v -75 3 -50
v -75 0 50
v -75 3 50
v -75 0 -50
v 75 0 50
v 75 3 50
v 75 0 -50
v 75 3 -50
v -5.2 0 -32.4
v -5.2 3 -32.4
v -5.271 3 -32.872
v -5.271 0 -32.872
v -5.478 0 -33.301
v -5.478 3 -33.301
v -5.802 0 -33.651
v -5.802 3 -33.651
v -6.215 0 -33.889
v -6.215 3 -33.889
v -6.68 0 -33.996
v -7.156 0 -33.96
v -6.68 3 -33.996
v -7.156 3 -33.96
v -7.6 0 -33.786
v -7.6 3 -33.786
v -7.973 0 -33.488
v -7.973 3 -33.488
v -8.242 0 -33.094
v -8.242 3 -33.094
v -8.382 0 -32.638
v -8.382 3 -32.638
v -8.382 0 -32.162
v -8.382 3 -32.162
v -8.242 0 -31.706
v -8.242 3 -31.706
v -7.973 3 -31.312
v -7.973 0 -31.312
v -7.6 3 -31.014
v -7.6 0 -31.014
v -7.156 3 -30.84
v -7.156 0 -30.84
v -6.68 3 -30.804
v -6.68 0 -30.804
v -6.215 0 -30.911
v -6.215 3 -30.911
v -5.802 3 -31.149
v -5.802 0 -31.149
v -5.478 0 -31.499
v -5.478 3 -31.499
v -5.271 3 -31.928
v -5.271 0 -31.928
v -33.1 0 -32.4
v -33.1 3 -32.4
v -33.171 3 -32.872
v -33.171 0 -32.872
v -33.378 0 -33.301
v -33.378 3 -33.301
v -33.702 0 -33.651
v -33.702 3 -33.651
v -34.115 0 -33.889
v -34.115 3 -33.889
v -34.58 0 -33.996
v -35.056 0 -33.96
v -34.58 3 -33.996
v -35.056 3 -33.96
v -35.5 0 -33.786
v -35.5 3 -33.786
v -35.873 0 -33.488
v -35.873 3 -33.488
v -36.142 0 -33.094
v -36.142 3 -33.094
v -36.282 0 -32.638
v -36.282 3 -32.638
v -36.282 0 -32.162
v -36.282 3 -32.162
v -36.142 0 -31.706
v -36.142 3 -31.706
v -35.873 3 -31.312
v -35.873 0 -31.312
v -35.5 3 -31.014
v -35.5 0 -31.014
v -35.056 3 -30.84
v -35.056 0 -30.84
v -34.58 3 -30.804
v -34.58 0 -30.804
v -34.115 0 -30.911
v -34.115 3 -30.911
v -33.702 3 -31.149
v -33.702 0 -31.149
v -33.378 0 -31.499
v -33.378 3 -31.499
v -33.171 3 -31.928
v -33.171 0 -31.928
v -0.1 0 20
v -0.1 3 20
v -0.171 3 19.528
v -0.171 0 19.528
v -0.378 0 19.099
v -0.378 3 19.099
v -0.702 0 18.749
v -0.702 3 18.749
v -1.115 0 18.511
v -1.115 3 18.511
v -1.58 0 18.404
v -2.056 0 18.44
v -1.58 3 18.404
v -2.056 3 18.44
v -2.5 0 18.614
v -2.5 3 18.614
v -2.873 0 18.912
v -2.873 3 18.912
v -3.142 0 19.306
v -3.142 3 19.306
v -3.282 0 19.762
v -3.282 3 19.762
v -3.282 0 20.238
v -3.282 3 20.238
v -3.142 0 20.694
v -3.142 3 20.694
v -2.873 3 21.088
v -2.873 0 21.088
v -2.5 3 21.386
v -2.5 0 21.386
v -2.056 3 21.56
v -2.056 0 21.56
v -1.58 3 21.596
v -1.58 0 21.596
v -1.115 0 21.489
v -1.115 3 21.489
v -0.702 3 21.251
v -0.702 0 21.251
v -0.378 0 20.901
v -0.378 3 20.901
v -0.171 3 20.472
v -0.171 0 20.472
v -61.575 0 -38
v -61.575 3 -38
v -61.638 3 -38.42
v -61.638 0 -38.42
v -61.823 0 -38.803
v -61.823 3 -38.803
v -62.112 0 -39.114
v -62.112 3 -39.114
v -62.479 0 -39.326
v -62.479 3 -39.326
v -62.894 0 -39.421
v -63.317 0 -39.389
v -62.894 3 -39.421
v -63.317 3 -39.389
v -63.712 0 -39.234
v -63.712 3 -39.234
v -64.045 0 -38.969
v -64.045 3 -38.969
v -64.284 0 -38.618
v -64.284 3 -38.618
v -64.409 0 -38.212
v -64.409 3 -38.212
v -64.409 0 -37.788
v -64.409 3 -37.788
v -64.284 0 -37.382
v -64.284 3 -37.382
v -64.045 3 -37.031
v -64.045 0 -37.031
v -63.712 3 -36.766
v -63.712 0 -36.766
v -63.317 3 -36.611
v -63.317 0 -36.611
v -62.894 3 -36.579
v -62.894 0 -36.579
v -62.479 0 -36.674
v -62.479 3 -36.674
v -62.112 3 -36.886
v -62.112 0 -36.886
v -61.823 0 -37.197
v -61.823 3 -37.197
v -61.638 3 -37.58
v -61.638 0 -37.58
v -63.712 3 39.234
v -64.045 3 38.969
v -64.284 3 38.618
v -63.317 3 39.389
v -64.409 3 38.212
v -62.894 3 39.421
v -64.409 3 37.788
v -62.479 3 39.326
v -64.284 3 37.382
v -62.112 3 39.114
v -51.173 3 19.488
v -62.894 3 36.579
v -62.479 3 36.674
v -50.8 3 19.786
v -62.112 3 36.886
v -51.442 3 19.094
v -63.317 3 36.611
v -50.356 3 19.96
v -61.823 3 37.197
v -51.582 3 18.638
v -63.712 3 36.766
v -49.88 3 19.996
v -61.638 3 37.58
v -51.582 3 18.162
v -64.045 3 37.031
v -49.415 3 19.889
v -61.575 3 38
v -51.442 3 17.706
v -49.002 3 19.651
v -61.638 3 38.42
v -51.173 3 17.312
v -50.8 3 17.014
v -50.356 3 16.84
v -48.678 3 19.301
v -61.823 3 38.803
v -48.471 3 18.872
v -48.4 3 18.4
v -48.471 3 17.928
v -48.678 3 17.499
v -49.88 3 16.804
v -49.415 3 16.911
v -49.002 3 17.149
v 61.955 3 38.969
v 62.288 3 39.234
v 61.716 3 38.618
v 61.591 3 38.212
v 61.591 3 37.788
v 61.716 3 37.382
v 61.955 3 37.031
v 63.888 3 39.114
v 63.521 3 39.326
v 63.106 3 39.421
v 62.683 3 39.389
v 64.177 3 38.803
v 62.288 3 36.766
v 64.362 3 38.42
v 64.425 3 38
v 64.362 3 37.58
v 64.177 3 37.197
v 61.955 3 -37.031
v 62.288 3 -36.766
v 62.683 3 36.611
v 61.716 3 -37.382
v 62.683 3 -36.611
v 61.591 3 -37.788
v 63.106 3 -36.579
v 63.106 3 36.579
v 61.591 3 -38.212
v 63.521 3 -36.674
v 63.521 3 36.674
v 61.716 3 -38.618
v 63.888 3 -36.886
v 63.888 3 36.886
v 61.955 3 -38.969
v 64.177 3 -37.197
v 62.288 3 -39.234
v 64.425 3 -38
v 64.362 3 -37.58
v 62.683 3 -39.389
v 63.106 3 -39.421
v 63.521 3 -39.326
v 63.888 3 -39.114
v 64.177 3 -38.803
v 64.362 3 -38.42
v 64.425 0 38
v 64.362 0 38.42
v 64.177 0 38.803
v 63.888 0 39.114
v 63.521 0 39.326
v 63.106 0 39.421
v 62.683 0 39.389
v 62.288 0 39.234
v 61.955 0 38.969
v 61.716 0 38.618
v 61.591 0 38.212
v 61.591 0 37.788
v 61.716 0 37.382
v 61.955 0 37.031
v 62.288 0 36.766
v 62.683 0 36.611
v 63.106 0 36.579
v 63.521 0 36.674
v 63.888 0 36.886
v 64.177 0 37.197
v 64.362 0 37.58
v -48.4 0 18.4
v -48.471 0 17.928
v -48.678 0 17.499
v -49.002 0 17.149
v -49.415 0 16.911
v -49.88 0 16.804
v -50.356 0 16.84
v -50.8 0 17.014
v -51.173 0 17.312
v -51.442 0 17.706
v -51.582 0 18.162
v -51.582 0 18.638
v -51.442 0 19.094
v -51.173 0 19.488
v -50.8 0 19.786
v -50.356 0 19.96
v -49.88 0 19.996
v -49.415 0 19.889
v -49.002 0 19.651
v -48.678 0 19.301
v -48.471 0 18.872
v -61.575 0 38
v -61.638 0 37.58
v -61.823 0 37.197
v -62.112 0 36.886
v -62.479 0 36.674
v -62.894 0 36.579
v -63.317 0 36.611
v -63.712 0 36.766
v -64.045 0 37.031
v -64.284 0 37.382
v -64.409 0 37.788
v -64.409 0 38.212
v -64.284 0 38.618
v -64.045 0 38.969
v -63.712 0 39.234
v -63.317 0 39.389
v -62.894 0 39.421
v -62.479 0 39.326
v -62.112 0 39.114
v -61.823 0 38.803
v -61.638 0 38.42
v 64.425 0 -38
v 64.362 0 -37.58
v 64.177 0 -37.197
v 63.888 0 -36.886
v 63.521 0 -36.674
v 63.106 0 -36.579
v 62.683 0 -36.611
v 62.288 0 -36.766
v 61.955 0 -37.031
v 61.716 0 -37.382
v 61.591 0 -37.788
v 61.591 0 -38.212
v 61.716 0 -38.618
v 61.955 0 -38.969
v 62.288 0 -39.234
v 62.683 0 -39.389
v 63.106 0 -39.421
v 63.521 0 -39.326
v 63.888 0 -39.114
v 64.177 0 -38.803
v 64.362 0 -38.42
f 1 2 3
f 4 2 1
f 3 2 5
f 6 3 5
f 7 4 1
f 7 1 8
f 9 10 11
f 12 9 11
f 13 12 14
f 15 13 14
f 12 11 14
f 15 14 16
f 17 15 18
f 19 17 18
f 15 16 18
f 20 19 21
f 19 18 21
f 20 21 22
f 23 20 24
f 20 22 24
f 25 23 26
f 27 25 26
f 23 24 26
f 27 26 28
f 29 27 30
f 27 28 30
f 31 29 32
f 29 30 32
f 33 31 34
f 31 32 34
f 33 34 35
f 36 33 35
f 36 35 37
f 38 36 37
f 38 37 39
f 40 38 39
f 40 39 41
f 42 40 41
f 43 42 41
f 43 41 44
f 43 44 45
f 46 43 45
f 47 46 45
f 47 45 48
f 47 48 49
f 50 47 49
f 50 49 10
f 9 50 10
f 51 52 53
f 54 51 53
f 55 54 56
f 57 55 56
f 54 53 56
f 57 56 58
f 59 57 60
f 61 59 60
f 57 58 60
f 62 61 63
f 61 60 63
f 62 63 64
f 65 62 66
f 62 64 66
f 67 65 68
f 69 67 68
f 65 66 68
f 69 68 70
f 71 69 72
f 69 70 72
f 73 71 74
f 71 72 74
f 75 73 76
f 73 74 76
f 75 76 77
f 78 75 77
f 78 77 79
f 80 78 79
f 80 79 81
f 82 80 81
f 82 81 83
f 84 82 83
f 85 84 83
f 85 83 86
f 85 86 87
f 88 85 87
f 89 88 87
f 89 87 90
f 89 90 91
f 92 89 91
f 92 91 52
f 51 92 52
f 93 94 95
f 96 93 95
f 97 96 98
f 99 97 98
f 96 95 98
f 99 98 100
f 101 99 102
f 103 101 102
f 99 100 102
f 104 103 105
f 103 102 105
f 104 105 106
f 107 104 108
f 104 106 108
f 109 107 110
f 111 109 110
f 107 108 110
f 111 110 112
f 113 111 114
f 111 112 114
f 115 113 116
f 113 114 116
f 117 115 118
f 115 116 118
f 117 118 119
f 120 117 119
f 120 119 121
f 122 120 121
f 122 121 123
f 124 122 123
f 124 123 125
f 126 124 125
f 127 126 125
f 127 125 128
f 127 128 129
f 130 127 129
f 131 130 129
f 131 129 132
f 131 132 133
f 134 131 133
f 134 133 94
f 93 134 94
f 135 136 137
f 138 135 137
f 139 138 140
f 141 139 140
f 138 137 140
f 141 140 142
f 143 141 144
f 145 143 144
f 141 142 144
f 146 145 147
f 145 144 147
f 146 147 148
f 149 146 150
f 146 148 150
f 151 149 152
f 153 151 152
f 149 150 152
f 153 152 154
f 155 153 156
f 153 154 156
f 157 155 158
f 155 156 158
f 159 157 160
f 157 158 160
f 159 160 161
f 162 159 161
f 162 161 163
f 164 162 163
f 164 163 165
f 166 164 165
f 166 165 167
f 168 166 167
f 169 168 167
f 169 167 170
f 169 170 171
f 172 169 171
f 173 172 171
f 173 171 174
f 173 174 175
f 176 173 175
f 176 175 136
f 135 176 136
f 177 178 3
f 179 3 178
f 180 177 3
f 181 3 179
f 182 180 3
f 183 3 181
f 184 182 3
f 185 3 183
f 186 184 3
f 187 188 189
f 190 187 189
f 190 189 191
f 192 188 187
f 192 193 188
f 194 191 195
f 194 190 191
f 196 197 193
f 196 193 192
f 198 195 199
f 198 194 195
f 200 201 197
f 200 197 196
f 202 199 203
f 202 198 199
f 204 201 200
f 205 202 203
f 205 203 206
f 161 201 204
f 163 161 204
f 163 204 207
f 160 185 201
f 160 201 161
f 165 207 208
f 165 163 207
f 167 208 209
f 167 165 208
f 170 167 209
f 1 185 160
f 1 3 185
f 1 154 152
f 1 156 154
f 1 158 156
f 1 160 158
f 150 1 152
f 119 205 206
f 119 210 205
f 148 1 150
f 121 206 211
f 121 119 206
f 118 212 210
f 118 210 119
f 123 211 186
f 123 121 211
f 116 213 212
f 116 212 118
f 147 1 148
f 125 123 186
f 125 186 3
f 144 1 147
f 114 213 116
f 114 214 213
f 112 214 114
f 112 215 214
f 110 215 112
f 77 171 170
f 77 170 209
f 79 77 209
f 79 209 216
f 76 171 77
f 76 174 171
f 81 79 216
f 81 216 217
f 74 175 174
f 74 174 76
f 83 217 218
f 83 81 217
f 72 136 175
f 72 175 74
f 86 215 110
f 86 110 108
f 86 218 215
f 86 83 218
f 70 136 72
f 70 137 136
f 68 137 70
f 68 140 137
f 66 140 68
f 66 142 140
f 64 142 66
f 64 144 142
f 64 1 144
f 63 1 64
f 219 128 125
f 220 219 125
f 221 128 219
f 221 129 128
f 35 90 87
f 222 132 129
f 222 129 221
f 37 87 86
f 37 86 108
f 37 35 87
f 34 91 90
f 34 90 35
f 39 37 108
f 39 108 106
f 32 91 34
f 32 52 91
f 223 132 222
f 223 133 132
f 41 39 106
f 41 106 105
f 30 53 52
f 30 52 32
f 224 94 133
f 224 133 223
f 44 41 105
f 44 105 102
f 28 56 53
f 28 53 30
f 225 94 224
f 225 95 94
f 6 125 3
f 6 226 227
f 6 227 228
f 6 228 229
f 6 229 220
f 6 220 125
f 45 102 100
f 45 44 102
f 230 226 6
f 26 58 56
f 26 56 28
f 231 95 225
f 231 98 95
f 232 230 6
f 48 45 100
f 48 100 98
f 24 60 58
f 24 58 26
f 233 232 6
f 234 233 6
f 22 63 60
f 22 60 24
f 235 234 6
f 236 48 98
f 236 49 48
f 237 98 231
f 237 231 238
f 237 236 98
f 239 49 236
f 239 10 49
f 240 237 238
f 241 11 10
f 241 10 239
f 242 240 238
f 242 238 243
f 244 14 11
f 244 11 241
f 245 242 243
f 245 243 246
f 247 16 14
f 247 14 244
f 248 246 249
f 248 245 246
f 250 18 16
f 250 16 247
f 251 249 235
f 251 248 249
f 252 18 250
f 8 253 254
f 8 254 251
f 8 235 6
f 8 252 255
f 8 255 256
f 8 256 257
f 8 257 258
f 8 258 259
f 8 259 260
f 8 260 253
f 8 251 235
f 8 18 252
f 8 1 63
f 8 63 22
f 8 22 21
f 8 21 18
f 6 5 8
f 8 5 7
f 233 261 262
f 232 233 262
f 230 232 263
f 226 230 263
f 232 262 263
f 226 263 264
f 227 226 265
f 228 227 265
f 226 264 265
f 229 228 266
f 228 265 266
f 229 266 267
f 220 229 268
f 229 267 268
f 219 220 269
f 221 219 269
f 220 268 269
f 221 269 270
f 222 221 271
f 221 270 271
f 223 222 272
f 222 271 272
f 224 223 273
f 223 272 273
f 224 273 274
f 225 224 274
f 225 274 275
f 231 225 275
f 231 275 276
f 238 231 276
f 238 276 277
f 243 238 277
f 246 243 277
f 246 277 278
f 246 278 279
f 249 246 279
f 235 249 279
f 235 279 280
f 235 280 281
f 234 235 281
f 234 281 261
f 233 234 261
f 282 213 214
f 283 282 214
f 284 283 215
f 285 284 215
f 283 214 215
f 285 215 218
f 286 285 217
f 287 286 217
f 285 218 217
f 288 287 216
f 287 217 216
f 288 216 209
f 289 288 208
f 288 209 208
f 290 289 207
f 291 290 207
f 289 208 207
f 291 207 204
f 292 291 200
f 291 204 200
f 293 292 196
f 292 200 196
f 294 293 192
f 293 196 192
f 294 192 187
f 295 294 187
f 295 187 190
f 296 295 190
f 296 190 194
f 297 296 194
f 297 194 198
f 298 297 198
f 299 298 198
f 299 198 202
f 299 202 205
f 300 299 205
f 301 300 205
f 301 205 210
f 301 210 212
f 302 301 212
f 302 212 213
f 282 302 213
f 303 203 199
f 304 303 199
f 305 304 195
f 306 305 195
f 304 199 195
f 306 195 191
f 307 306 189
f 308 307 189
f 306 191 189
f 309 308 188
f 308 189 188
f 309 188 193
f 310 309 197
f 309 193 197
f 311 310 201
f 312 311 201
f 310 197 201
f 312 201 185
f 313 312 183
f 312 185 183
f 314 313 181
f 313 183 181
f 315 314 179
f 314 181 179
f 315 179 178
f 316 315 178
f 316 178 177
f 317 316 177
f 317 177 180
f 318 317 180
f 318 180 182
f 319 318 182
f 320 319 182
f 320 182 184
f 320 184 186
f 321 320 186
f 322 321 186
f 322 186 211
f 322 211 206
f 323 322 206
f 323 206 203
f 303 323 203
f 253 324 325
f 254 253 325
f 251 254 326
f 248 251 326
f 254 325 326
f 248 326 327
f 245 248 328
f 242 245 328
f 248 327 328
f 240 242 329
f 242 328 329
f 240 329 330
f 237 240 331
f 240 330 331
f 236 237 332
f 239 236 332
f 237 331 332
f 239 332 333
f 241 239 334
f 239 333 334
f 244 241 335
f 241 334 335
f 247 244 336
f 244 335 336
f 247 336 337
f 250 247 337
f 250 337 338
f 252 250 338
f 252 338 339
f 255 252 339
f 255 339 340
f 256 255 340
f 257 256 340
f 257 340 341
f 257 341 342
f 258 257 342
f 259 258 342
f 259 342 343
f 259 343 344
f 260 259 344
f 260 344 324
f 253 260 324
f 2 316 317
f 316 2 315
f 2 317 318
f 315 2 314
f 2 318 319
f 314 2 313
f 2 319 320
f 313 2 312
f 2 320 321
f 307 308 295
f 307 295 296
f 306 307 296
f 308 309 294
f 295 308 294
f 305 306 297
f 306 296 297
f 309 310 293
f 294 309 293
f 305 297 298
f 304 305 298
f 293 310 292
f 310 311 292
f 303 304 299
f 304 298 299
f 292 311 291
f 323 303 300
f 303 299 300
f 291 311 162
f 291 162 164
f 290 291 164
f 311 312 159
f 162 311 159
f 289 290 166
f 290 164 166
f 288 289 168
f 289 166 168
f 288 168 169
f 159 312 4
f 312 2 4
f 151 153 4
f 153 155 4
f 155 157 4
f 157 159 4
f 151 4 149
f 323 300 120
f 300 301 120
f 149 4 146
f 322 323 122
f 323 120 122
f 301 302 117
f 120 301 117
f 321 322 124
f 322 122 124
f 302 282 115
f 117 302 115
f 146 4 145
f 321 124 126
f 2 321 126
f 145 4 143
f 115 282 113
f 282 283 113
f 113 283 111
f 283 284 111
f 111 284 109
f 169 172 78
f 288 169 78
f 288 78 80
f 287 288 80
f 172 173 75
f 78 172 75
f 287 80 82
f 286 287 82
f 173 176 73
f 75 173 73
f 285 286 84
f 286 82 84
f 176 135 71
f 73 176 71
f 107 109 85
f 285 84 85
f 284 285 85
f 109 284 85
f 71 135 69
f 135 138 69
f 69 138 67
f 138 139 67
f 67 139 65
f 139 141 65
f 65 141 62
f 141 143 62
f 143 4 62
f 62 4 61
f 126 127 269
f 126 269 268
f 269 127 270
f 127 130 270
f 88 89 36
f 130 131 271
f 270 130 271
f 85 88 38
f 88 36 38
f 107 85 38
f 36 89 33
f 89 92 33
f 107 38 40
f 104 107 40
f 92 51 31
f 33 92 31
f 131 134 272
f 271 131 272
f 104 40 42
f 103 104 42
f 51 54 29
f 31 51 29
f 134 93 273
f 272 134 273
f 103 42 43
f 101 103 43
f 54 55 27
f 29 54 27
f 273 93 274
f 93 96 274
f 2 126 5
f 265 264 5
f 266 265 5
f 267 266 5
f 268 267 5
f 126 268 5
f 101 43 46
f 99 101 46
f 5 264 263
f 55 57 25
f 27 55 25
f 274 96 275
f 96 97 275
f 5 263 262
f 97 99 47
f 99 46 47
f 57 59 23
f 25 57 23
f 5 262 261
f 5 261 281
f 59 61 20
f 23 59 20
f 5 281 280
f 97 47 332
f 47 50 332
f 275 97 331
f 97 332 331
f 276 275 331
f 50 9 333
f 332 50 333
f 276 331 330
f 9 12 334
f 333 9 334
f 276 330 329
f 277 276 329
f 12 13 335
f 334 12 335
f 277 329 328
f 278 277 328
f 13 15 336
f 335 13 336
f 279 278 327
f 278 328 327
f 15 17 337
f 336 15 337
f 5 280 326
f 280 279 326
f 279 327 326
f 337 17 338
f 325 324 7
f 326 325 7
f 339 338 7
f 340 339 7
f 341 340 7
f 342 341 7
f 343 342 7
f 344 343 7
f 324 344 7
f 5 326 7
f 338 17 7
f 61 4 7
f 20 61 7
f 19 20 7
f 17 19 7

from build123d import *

# Parameters (mm, degrees)
SKETCH1_W           = 150
SKETCH1_H           = 100
BOSS_EXTRUDE1_DEPTH = 3
SKETCH2_R           = 1.425
CUT_EXTRUDE1_DEPTH  = 10
LPATTERN1_COUNT     = 2
LPATTERN1_PITCH     = 76
SKETCH5_R           = 1.6
CUT_EXTRUDE4_DEPTH  = 10
SKETCH6_R           = 1.425
CUT_EXTRUDE5_DEPTH  = 10


with BuildPart() as part:
    # Sketch1 → Boss-Extrude1 (new body)
    with BuildSketch(Plane(origin=(0, 0, 0), x_dir=(1, 0, 0), z_dir=(0, 1, 0))):
        Rectangle(SKETCH1_W, SKETCH1_H)
    extrude(amount=BOSS_EXTRUDE1_DEPTH)

    # Sketch2 → Cut-Extrude1 (cut)
    with BuildSketch(Plane(origin=(0, 3, 0), x_dir=(1, 0, 0), z_dir=(0, 1, 0))):
        with Locations((-63, 38)):
            Circle(SKETCH2_R)
    cut_extrude1 = extrude(amount=-CUT_EXTRUDE1_DEPTH, mode=Mode.SUBTRACT)

    # LPattern1: Cut-Extrude1 ×2
    with Locations(*[(0, 0, i * LPATTERN1_PITCH) for i in range(1, LPATTERN1_COUNT)]):
        add(cut_extrude1, mode=Mode.SUBTRACT)

    # Sketch5 → Cut-Extrude4 (cut)
    with BuildSketch(Plane(origin=(0, 3, 0), x_dir=(1, 0, 0), z_dir=(0, 1, 0))):
        with Locations((-34.7, 32.4)):
            Circle(SKETCH5_R)
        with Locations((-6.8, 32.4)):
            Circle(SKETCH5_R)
        with Locations((-1.7, -20)):
            Circle(SKETCH5_R)
        with Locations((-50, -18.4)):
            Circle(SKETCH5_R)
    extrude(amount=-CUT_EXTRUDE4_DEPTH, mode=Mode.SUBTRACT)

    # Sketch6 → Cut-Extrude5 (cut)
    with BuildSketch(Plane.XZ):
        with Locations((63, 38)):
            Circle(SKETCH6_R)
        with Locations((63, -38)):
            Circle(SKETCH6_R)
    extrude(amount=-CUT_EXTRUDE5_DEPTH, mode=Mode.SUBTRACT)


solid = part.part
